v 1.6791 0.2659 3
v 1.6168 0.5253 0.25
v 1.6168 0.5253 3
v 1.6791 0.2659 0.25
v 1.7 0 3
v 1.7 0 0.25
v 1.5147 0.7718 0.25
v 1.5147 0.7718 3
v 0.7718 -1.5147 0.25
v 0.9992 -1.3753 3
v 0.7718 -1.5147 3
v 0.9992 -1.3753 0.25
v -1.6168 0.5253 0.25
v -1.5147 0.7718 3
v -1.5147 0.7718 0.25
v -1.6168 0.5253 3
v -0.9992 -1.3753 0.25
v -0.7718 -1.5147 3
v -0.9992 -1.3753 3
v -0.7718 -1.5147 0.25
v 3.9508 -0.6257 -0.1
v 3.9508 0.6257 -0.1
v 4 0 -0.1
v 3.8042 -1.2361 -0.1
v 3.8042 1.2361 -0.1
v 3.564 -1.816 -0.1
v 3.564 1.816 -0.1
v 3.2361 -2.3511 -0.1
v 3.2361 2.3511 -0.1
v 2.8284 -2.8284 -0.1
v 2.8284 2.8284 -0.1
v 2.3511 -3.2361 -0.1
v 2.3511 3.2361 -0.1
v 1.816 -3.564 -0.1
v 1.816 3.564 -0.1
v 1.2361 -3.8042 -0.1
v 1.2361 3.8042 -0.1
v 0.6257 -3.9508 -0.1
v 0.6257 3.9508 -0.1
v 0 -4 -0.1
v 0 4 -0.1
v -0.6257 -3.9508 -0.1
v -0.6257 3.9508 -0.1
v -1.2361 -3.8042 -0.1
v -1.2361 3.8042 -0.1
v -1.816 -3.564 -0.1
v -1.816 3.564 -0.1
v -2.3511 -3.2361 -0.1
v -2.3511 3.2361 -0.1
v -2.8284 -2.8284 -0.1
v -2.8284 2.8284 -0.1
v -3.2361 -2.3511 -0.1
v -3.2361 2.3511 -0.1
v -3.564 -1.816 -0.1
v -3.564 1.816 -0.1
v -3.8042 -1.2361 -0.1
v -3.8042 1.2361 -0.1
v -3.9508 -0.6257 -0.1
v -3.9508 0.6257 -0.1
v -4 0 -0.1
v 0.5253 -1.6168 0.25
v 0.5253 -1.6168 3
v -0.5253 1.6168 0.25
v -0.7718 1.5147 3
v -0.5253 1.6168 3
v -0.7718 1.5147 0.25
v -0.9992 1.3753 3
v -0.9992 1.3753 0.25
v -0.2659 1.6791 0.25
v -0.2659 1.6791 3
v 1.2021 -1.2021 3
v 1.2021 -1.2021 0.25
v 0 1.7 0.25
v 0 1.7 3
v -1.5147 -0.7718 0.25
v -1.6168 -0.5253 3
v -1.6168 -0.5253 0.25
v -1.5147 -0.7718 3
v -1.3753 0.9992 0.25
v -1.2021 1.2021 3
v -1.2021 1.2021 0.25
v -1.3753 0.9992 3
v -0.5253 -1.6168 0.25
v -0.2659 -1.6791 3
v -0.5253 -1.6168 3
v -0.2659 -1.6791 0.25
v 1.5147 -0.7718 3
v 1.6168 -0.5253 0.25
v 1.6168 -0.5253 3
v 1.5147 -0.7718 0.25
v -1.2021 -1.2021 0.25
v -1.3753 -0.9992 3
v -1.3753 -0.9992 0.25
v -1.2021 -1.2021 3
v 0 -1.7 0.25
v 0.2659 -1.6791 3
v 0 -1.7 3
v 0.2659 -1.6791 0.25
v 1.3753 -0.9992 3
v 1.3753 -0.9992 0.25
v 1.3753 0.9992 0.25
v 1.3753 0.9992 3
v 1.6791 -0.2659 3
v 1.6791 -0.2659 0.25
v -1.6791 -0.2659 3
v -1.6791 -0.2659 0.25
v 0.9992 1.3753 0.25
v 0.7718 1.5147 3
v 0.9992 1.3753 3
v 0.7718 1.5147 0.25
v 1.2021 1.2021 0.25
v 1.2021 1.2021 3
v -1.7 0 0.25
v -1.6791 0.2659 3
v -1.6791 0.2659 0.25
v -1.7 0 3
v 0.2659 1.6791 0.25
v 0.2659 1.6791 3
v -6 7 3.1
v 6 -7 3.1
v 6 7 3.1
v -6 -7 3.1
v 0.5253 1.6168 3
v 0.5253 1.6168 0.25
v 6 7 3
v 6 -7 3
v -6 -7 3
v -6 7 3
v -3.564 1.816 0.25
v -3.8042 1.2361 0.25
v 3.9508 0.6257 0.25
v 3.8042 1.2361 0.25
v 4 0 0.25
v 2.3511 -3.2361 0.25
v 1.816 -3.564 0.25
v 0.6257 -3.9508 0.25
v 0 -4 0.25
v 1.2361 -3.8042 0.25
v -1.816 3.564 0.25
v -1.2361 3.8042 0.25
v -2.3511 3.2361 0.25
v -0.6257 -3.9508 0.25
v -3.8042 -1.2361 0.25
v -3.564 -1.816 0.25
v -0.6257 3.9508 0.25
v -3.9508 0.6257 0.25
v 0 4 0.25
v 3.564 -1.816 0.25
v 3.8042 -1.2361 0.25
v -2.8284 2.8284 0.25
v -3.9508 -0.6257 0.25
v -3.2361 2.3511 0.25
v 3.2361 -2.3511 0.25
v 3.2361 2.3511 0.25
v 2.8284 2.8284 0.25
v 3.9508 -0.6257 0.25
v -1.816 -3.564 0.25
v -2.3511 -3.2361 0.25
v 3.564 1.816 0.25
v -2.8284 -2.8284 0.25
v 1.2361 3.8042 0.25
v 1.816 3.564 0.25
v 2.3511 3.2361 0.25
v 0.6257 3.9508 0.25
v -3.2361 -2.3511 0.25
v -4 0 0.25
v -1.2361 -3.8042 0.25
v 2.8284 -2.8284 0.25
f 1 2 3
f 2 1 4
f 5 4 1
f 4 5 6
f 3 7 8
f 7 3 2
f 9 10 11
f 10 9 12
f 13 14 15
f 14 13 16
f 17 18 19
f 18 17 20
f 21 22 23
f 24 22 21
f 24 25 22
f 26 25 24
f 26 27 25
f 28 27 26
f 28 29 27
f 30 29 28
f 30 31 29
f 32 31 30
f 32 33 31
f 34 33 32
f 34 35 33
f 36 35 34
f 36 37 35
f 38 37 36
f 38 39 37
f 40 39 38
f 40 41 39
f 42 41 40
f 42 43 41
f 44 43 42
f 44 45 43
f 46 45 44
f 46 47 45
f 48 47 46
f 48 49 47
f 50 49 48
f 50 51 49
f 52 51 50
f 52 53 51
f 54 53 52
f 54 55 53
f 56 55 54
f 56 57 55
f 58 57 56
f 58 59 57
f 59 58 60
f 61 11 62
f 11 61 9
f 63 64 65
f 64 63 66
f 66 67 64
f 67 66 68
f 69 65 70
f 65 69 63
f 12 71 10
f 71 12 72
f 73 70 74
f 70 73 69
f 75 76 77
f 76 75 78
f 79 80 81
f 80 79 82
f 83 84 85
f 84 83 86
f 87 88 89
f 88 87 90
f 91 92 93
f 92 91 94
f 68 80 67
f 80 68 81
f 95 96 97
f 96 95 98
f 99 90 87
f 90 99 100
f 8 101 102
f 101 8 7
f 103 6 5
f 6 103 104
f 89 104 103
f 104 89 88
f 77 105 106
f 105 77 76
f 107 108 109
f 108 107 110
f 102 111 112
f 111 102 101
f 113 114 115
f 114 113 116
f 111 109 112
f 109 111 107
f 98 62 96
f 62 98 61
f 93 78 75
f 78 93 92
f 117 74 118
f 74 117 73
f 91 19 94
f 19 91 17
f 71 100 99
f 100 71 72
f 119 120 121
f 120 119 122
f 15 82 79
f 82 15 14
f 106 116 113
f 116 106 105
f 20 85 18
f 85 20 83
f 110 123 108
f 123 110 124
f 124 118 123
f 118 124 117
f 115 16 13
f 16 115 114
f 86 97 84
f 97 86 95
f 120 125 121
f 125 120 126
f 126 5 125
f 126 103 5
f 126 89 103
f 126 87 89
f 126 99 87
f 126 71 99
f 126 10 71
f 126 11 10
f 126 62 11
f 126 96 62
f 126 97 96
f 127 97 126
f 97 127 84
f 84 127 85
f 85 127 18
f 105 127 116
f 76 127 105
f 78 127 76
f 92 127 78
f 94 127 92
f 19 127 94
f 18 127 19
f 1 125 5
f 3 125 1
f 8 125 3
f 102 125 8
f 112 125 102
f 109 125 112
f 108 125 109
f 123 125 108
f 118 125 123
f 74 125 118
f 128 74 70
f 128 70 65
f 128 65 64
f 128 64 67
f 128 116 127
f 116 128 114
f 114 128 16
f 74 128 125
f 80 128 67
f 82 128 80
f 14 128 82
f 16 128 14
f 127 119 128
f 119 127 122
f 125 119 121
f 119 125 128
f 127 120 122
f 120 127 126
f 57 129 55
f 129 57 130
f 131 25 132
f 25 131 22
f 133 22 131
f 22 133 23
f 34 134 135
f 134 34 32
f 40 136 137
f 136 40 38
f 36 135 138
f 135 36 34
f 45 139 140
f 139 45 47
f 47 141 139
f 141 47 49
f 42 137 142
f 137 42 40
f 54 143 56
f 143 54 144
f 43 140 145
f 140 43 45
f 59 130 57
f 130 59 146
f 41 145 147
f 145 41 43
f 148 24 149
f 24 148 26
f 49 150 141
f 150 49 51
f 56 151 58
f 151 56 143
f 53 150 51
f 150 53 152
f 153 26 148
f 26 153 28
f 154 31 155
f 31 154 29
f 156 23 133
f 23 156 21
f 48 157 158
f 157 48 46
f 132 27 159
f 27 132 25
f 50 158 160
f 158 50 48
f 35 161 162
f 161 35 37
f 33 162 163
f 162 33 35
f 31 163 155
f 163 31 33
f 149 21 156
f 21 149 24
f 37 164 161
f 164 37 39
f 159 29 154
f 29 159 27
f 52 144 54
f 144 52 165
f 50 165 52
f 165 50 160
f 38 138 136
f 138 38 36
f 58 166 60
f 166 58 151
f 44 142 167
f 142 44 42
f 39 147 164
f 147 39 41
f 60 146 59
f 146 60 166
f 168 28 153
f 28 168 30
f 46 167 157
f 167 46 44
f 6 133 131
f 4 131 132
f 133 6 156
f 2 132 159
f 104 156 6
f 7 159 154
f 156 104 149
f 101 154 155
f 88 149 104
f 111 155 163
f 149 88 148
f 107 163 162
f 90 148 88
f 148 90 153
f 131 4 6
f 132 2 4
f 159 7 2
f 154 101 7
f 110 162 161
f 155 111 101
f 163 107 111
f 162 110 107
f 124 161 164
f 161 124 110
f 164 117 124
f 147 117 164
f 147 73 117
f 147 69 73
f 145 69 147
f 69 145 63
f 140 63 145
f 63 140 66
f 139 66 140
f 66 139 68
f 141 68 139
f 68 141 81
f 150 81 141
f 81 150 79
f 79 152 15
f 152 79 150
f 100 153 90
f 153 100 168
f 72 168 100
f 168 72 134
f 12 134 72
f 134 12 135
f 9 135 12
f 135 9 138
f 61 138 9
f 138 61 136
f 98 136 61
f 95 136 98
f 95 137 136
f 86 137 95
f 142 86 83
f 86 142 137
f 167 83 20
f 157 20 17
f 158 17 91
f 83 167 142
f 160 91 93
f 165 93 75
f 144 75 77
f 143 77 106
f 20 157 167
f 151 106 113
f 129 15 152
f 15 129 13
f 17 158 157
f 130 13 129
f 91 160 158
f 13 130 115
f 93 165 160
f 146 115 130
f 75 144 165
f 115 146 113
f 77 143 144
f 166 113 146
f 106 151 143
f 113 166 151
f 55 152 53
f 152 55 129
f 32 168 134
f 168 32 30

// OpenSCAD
function m3_cap_diameter() = 6.0; 
function m3_cap_h() = 3;
function m3_nut_G() = 6.6;
function m3_nut_G_inner_diff()=0.2;
function m3_nut_h() = 2.4 + 0.2;
function m3_screw_diameter() = 3.4; //M3 screw + diff (prev 0.4)
function m3_washer_diameter_diff() = 1;
function m3_washer_diameter() = 7 + m3_washer_diameter_diff(); // M3 washer diameter 7mm + diff
function m3_washer_thickness() = 0.5;
function m3_square_nut_S_real()=5.5;
function m3_square_nut_S()=m3_square_nut_S_real()+0.2;
function m3_square_nut_H()=1.8+0.2;

function m5_cap_h() = 4.82+0.18;
function m5_cap_diameter() = 9;
function m5_screw_diameter_diff() = 1;
function m5_screw_diameter() = 5 + m5_screw_diameter_diff();
function m5_washer_diameter_diff() = 0.2+0.2;//24.1.2021
function m5_washer_diameter() = 10 + m5_washer_diameter_diff();
function m5_washer_height() = 1;
function m5_nut_G() = 9;
function m5_nut_S() = 7.95+0.3; //orig 7.95
function m5_nut_H() = 4.49 + 0.2;

function m6_cap_h() = 5.7+0.2;
function m6_screw_diameter_diff() = 1;
function m6_screw_diameter() = 6 + m6_screw_diameter_diff();
function m6_washer_diameter_diff() = 0.2+0.2;
function m6_washer_diameter() = 12 + m6_washer_diameter_diff();
function m6_washer_height() = 1.5;

function m8_nut_G() = 14.38+1;
function m8_nut_H() = 6.8+0.2;

function m2p5_screw_diameter() = 2.5+0.3;
function m2p5_nut_G() = 5.45+0.2;
function m2p5_nut_H() = 2+0.2;

module m3_screw(h,cap_out=m3_cap_h(),cap_side_out=0)
{
	translate ([0,0,-0.1])
		cylinder (d=m3_screw_diameter(),h=h+0.1,$fn=20);
	translate ([0,0,-cap_out])
	hull()
	{
		cylinder (d=m3_cap_diameter(),h=cap_out,$fn=30);
		translate ([cap_side_out,0,0])
			cylinder (d=m3_cap_diameter(),h=cap_out,$fn=30);
	}
}
module m3_screw_add()
{
	translate ([0,0,0])
		cylinder (d=m3_cap_diameter()+0.1,h=0.4,$fn=30);
}
module m3_washer(out=10,offs=0,sphere=false)
{
	fn=60;
	translate ([0,0,-out+m3_washer_thickness()])
	{
		dd=m3_washer_diameter()+offs*2;
		cylinder (d=dd,h=out,$fn=fn);
		if (sphere)
			sphere (d=dd,$fn=fn);
	}
}
module m3_washer_add(out=10)
{
	translate ([0,0,-out+m3_washer_thickness()+out])
		cylinder (d=m3_washer_diameter()+0.1,h=0.4,$fn=30);
}
module m3_square_nut(out=20,offs=0.2,short_fix=false)
{
	square=m3_square_nut_S()+offs;
	translate ([-square/2,-square/2,0])
	{
		cube ([square,square+out,m3_square_nut_H()],false);
		diff=0.2;
		in=short_fix?2:0;
		translate ([-diff,square-0.2-in,-diff])
			cube ([square+diff*2,0.2+out,m3_square_nut_H()+diff*2],false);
	}
}
module m3_square_nut_planar(out=20)
{
	hh=m3_square_nut_H();
	translate ([-m3_square_nut_S_real()/2,-m3_square_nut_S_real()/2,0])
		cube ([m3_square_nut_S_real(),m3_square_nut_S_real(),hh],false);	
	translate ([-m3_square_nut_S()/2,-m3_square_nut_S()/2,hh-0.01])
		cube ([m3_square_nut_S(),m3_square_nut_S(),out],false);
}

module nut(G=undef,H,S=undef)
{
    // G,e
	// S,F
    //R = 0.5; A = 0; x = cos(A) * R; y = sin(A) * R;
	
	gg=str(S) != "undef" ? S/cos(30) : G;
	
    nut_points=[
	 [0.5,0]
	,[0.25,0.433013]
	,[-0.25,0.433013]
	,[-0.5,0]
	,[-0.25,-0.433013]
	,[0.25,-0.433013]
    ];

    scale ([gg,gg,1])
    linear_extrude(H)
	polygon (points=nut_points);
}

module m3_nut(h=m3_nut_h())
{
	nut(G=m3_nut_G(),H=h);
}

module m3_nut_inner(h=m3_nut_h(),diff=0)
{
	nut(G=m3_nut_G()-m3_nut_G_inner_diff()-diff,H=h);
}

module m5_screw(h,cap_out=m5_cap_h())
{
	translate ([0,0,-0.1])
		cylinder (d=m5_screw_diameter(),h=h+0.1,$fn=20);
	translate ([0,0,-cap_out])
		cylinder (d=m5_cap_diameter(),h=cap_out,$fn=30);
}

module mn_screw_washer(screw_diameter
					,washer_diameter
					,washer_height
					,thickness
					,diff=0.1
					,washer_out=0
					,washer_side_out=0
					,washer_side_out_add=0
					,washer_spere=false
					,tnut=false
)
{
	tnut_dim=[12,14,diff];
	translate ([0,0,-diff])
	{
		cylinder (d=screw_diameter, h=thickness+diff*2,$fn=40);
		if (tnut)
			translate ([-tnut_dim.x/2,-tnut_dim.y/2,thickness+diff])
				cube (tnut_dim);
			
		translate ([0,0,-washer_out])
		{
			cylinder (d=washer_diameter, h=washer_height/2+diff+washer_out,$fn=40);
			if (washer_spere)
				sphere (d=washer_diameter, $fn=40);
			if (washer_side_out>0)
			{
				hull()
				{
					cylinder (d=washer_diameter, h=washer_out,$fn=40);
					if (washer_spere)
						sphere (d=washer_diameter, $fn=40);
					translate ([washer_side_out,0,0])
					{
						cylinder (d=washer_diameter+washer_side_out_add, h=washer_out,$fn=40);
						if (washer_spere)
							sphere (d=washer_diameter, $fn=40);
					}
				}
			}
		}
	}
}

module m5n_screw_washer(thickness
						,diff=0.1
						,washer_out=0
						,washer_side_out=0
						,washer_side_out_add=0
						,washer_spere=false
						,tnut=false
						,cap_only=false
)
{
	mn_screw_washer(screw_diameter=m5_screw_diameter()
					,washer_diameter=cap_only?m5_cap_diameter():m5_washer_diameter()
					,washer_height=m5_washer_height()
					,thickness=thickness
					,diff=diff
					,washer_out=washer_out
					,washer_side_out=washer_side_out
					,washer_side_out_add=washer_side_out_add
					,washer_spere=washer_spere
					,tnut=tnut
	);
}

module m6n_screw_washer(thickness, diff=0.1, washer_out=0,washer_side_out=0,washer_side_out_add=0,washer_spere=false)
{
	mn_screw_washer(screw_diameter=m6_screw_diameter()
					,washer_diameter=m6_washer_diameter()
					,washer_height=m6_washer_height()
					,thickness=thickness
					,diff=diff
					,washer_out=washer_out
					,washer_side_out=washer_side_out
					,washer_side_out_add=washer_side_out_add
					,washer_spere=washer_spere);
}

module m3n_screw_washer(thickness
						,diff=0.1
						,washer_out=0
						,washer_side_out=0
						,washer_side_out_add=0
						,washer_spere=false
						,tnut=false
						,cap_only=false
)
{
	mn_screw_washer(screw_diameter=m3_screw_diameter()
					,washer_diameter=cap_only?m3_cap_diameter():m3_washer_diameter()
					,washer_height=m3_washer_thickness()
					,thickness=thickness
					,diff=diff
					,washer_out=washer_out
					,washer_side_out=washer_side_out
					,washer_side_out_add=washer_side_out_add
					,washer_spere=washer_spere
					,tnut=tnut
	);
}
m3n_screw_washer(thickness=3,tnut=true);

module m5n_screw_washer_add()
{
	translate ([0,0,m5_washer_height()/2])
	{
		cylinder (d=m5_washer_diameter()+0.2, h=0.3,$fn=40);
	}
}
